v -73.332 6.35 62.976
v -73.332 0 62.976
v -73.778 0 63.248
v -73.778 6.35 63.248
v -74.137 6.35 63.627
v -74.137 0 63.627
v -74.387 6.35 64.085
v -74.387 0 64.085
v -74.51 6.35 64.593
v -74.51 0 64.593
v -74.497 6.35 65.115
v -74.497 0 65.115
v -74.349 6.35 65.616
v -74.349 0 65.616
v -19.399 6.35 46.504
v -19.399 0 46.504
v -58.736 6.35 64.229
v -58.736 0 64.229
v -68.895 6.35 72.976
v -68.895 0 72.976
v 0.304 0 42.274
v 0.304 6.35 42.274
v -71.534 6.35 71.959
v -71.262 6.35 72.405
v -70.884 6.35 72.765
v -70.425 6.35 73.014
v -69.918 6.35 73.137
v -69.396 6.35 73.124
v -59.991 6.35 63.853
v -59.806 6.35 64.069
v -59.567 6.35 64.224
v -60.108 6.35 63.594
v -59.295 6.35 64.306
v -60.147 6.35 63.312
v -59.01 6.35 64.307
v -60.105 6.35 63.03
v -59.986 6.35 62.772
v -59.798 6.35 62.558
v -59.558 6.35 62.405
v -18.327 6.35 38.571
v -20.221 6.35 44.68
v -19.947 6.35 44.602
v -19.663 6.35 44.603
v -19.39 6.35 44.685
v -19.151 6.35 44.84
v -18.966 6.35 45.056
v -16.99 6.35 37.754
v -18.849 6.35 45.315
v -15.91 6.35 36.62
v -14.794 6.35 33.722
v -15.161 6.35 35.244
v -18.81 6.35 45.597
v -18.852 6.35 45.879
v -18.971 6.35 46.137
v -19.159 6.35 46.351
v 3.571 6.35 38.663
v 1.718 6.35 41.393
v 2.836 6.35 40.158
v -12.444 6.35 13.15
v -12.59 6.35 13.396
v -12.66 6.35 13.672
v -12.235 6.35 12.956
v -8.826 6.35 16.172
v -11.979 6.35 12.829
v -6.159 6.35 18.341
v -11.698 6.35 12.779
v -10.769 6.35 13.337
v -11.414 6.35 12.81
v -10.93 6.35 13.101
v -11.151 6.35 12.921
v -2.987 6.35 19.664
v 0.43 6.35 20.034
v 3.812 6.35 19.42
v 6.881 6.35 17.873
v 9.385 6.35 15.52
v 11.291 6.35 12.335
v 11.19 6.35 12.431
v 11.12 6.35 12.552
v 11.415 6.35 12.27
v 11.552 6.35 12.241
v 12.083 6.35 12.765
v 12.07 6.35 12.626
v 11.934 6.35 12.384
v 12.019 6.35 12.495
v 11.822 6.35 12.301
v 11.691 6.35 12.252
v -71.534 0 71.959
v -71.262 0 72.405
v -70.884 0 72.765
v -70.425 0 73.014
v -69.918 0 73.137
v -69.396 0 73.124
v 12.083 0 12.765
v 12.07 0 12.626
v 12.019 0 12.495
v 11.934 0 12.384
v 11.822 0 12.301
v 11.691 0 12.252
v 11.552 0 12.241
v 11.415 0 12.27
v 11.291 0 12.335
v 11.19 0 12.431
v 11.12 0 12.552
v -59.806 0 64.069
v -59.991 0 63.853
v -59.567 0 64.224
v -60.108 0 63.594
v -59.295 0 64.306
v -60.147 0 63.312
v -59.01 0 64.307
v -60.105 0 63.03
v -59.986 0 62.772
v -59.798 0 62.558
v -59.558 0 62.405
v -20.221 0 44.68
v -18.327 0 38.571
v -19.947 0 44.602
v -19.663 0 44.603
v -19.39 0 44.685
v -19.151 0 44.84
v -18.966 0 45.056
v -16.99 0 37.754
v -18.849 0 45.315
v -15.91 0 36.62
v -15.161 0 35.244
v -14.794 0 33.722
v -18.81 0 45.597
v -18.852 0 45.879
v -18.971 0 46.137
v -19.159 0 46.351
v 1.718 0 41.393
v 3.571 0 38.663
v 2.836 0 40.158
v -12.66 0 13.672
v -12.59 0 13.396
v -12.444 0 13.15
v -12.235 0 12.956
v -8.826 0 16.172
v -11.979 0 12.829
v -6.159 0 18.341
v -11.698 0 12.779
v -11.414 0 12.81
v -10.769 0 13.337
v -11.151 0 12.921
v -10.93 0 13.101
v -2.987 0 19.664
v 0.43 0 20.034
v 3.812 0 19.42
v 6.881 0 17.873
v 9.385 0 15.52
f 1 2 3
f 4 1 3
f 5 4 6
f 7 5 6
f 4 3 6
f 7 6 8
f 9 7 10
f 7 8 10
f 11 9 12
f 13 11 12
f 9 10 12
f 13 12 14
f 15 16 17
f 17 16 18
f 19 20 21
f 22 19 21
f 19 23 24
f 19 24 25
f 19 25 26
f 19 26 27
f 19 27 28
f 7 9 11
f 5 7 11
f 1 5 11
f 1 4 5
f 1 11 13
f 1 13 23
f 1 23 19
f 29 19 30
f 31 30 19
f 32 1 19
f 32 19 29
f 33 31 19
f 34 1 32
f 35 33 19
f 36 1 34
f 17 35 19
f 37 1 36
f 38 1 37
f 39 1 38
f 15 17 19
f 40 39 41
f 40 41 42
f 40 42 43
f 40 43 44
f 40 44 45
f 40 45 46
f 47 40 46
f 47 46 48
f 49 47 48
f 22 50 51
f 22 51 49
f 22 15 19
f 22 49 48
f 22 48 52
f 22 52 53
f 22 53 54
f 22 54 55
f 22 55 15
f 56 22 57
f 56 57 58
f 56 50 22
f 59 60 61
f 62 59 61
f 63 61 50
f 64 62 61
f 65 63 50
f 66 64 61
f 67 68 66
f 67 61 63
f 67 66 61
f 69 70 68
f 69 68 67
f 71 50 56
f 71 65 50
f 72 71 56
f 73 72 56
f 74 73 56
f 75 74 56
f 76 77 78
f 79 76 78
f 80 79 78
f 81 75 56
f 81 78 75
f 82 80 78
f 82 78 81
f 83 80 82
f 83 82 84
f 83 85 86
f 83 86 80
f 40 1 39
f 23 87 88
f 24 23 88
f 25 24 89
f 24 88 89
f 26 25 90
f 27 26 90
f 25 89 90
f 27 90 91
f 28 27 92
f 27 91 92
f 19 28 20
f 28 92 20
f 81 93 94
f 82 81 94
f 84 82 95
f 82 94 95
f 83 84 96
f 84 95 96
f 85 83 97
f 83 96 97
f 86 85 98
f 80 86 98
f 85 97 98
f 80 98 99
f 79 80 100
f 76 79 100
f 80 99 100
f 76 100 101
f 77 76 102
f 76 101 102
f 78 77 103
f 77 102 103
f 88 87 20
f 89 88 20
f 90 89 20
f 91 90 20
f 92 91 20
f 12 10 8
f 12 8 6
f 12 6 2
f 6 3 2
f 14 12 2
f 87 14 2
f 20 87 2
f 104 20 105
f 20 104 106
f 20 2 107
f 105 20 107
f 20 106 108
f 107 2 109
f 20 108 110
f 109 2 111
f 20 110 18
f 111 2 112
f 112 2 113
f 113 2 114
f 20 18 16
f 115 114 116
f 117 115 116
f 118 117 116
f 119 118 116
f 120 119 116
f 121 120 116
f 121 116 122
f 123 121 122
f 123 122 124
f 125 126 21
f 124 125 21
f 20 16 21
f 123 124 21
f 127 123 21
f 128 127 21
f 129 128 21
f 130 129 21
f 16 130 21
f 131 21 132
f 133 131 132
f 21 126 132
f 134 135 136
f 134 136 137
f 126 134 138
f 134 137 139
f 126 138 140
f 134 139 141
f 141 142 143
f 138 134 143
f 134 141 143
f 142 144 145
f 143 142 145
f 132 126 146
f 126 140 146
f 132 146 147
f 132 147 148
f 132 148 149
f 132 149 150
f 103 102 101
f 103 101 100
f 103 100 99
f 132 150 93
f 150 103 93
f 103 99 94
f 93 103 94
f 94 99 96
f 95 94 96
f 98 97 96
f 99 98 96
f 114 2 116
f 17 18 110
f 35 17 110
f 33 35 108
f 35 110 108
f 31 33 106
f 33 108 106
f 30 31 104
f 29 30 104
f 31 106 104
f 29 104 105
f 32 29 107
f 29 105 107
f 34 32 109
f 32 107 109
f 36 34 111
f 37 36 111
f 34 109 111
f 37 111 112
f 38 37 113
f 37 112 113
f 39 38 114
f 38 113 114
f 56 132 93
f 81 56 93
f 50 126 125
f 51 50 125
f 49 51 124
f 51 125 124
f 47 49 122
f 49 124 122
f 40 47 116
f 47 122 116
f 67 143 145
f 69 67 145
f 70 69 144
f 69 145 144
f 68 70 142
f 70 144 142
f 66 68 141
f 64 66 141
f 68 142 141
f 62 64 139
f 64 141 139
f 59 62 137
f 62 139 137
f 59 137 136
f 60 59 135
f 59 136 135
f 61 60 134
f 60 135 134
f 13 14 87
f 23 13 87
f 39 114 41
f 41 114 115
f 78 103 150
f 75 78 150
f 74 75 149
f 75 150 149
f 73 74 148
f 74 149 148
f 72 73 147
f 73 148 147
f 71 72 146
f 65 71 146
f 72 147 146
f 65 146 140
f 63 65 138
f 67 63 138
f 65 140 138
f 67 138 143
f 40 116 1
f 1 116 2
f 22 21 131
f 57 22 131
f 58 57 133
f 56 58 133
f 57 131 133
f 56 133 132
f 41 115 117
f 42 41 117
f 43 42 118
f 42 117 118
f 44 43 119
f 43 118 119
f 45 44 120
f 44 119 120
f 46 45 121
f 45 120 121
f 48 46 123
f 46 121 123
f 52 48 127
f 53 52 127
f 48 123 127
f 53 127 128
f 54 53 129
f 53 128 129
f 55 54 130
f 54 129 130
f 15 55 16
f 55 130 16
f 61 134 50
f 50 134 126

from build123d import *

# Parameters (mm, degrees)
BOSS_EXTRUDE1_DEPTH = 6.35


with BuildPart() as part:
    # Sketch1 → Boss-Extrude1 (new body)
    with BuildSketch(Plane(origin=(0, 0, 0), x_dir=(1, 0, 0), z_dir=(0, 1, 0))):
        with BuildLine():
            Line((-12.660316566, -13.672486937), (-14.793671701, -33.72155142))
            ThreePointArc((-14.793671701, -33.72155142), (-15.910435011, -36.619656083), (-18.326632738, -38.571106689))
            Line((-18.326632738, -38.571106689), (-73.332068985, -62.976257477))
            ThreePointArc((-73.332068985, -62.976257477), (-74.387185899, -64.085254343), (-74.349087019, -65.615513872))
            Line((-74.349087019, -65.615513872), (-71.53446378, -71.959239443))
            ThreePointArc((-71.53446378, -71.959239443), (-70.425466914, -73.014356356), (-68.895207385, -72.976257477))
            Line((-68.895207385, -72.976257477), (0.303992163, -42.273530354))
            ThreePointArc((0.303992163, -42.273530354), (2.320082288, -40.814341122), (3.57063844, -38.662606492))
            Line((3.57063844, -38.662606492), (12.082791936, -12.764755482))
            ThreePointArc((12.082791936, -12.764755482), (11.691090758, -12.25206691), (11.120053366, -12.552392867))
            ThreePointArc((11.120053366, -12.552392867), (0.429889276, -20.034212045), (-10.768550895, -13.337036209))
            ThreePointArc((-10.768550895, -13.337036209), (-11.84052795, -12.793656499), (-12.660316566, -13.672486937))
        make_face()
        with BuildLine():
            Line((-59.558046082, -62.405054335), (-20.220801555, -44.680449865))
            ThreePointArc((-20.220801555, -44.680449865), (-18.898273358, -45.181368191), (-19.399191684, -46.503896387))
            Line((-19.399191684, -46.503896387), (-58.736436211, -64.228500857))
            ThreePointArc((-58.736436211, -64.228500857), (-60.058964408, -63.727582531), (-59.558046082, -62.405054335))
        make_face(mode=Mode.SUBTRACT)
    extrude(amount=BOSS_EXTRUDE1_DEPTH)


solid = part.part
